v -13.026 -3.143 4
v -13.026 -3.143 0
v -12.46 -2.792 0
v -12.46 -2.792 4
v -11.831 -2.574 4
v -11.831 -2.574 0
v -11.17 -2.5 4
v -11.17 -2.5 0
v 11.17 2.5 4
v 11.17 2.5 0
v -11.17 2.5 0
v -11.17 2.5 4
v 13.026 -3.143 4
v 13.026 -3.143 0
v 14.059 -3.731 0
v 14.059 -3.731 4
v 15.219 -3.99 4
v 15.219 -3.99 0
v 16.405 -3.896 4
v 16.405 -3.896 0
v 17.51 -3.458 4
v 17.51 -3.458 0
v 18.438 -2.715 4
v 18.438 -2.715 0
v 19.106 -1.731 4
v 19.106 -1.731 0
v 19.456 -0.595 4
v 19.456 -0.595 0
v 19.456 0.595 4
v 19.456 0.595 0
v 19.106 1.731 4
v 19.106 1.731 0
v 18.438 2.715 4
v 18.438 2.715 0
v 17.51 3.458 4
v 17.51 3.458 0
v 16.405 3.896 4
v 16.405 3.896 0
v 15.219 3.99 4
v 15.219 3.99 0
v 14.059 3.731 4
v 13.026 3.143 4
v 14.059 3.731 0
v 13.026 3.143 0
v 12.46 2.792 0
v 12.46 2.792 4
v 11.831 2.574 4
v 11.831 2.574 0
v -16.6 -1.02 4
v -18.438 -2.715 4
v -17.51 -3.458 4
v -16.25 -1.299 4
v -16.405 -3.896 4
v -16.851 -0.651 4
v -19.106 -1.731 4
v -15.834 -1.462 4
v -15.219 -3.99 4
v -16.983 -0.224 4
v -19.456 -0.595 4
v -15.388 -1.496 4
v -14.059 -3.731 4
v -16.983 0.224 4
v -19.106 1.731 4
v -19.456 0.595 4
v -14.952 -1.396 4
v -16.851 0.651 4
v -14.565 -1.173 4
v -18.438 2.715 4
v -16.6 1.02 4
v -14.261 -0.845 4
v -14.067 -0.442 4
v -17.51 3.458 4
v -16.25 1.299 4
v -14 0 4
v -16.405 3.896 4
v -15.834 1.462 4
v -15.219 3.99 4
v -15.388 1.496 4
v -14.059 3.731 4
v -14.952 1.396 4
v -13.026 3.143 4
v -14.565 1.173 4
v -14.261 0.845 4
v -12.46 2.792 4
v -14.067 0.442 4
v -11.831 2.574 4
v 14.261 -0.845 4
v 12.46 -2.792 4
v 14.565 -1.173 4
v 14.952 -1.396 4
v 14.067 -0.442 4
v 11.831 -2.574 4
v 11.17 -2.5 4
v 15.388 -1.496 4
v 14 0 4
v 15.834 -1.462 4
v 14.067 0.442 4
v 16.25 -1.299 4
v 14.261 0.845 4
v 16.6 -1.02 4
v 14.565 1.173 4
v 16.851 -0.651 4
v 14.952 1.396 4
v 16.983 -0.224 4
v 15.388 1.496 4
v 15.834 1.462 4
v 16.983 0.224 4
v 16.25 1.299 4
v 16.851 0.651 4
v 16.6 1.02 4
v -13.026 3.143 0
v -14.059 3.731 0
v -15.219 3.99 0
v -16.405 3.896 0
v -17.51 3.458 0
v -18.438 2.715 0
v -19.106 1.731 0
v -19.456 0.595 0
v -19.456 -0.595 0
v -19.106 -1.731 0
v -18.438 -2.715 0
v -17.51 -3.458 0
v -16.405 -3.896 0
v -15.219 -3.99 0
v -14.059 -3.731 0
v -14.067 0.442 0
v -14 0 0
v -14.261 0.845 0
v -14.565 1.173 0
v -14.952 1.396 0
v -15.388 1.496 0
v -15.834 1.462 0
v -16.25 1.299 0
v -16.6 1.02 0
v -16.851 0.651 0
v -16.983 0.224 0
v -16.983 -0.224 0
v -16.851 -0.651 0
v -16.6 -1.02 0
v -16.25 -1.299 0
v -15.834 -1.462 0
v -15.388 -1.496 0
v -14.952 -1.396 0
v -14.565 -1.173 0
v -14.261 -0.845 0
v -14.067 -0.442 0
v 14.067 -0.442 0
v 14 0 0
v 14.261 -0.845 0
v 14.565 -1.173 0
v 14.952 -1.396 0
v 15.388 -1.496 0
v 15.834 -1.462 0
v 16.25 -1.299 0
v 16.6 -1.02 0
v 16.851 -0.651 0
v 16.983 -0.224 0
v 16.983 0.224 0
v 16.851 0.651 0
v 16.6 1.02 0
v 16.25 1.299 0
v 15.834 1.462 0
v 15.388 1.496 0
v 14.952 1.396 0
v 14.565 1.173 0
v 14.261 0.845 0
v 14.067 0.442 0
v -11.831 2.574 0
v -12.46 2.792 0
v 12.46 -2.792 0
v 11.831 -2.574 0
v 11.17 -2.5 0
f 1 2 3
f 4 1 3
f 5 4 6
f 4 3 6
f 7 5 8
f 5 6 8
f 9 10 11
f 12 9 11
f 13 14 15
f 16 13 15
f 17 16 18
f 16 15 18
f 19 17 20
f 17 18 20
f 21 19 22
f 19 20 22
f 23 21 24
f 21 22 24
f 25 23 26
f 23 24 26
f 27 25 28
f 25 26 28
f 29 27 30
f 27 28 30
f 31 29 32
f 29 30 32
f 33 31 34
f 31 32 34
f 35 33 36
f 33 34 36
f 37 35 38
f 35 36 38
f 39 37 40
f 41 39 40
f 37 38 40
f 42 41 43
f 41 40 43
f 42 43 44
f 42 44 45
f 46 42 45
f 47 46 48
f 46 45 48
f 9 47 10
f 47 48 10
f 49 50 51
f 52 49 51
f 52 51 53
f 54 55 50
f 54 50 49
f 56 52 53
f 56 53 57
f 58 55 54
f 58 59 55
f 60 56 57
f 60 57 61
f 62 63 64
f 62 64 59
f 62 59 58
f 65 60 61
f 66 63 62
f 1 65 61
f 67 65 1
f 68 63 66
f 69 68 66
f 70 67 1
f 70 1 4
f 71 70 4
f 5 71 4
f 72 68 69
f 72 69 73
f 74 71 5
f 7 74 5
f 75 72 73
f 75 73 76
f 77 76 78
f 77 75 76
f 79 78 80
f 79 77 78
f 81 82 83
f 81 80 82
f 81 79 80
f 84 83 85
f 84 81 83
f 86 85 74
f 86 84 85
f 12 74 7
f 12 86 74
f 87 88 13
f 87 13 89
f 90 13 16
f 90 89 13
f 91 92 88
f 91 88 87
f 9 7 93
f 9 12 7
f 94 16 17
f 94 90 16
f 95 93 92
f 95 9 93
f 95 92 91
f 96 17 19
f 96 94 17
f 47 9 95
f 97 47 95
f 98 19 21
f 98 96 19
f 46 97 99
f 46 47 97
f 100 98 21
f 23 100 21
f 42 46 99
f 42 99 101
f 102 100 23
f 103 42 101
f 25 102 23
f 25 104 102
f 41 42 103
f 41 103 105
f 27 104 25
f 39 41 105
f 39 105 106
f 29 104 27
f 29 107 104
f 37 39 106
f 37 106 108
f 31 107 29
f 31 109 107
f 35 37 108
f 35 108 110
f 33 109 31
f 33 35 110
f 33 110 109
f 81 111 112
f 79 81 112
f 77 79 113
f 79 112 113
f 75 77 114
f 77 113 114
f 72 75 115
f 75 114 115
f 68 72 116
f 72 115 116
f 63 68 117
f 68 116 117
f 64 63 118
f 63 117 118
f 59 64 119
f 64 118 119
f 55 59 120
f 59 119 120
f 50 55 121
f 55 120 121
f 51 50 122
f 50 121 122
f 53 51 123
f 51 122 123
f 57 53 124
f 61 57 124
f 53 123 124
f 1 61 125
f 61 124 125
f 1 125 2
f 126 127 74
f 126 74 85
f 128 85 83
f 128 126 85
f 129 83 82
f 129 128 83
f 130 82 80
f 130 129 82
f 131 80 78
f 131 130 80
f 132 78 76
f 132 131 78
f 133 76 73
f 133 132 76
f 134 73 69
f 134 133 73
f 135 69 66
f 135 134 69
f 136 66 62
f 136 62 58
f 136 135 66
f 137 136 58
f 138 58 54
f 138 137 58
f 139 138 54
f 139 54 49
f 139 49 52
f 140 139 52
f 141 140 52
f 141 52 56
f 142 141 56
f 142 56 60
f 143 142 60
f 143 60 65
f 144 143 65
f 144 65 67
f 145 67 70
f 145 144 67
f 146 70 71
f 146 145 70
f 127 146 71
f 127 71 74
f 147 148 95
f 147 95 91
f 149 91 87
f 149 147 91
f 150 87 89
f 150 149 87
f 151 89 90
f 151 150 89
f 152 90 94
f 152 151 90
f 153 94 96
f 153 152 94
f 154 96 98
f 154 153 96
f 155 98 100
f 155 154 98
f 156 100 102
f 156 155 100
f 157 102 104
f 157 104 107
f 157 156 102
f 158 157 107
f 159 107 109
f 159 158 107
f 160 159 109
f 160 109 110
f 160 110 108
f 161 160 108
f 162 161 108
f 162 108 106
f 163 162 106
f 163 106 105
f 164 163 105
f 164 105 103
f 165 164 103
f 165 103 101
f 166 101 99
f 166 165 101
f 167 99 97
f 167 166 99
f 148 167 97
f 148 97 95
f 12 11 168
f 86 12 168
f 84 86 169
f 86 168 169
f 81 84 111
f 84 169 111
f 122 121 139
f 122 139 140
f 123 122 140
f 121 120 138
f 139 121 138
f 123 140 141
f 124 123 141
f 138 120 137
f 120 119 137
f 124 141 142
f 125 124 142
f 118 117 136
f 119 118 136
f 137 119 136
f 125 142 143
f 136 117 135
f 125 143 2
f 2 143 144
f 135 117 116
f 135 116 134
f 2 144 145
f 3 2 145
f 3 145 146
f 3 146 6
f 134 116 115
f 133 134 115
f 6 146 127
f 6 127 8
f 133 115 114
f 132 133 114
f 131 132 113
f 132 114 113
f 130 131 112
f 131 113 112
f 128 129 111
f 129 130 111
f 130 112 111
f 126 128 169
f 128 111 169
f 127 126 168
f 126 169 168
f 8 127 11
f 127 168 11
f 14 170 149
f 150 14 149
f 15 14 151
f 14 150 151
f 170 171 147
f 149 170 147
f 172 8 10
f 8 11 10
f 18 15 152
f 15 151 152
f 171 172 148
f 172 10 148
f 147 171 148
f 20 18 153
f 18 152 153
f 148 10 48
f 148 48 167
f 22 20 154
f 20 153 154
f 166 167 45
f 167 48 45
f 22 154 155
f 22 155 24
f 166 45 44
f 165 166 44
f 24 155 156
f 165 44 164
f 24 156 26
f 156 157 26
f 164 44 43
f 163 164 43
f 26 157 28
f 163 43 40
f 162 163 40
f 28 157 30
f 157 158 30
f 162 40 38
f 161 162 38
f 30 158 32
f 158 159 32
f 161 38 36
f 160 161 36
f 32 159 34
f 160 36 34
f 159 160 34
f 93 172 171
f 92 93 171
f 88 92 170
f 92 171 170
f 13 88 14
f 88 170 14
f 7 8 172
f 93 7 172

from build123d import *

# Parameters (mm, degrees)
SKETCH1_R           = 1.5
BOSS_EXTRUDE1_DEPTH = 4


with BuildPart() as part:
    # Sketch1 → Boss-Extrude1 (new body)
    with BuildSketch(Plane.XY):
        with BuildLine():
            Line((-11.169872981, -2.5), (11.169872981, -2.5))
            ThreePointArc((11.169872981, -2.5), (12.151853487, -2.665266452), (13.025641703, -3.142857143))
            ThreePointArc((13.025641703, -3.142857143), (19.5, 0), (13.025641703, 3.142857143))
            ThreePointArc((13.025641703, 3.142857143), (12.151853487, 2.665266452), (11.169872981, 2.5))
            Line((11.169872981, 2.5), (-11.169872981, 2.5))
            ThreePointArc((-11.169872981, 2.5), (-12.151853487, 2.665266452), (-13.025641703, 3.142857143))
            ThreePointArc((-13.025641703, 3.142857143), (-19.5, 0), (-13.025641703, -3.142857143))
            ThreePointArc((-13.025641703, -3.142857143), (-12.151853487, -2.665266452), (-11.169872981, -2.5))
        make_face()
        with Locations((-15.5, 0)):
            Circle(SKETCH1_R, mode=Mode.SUBTRACT)
        with Locations(Location((15.5, 0, 0), (0, 0, 180))):
            Circle(SKETCH1_R, mode=Mode.SUBTRACT)
    extrude(amount=BOSS_EXTRUDE1_DEPTH)


solid = part.part
